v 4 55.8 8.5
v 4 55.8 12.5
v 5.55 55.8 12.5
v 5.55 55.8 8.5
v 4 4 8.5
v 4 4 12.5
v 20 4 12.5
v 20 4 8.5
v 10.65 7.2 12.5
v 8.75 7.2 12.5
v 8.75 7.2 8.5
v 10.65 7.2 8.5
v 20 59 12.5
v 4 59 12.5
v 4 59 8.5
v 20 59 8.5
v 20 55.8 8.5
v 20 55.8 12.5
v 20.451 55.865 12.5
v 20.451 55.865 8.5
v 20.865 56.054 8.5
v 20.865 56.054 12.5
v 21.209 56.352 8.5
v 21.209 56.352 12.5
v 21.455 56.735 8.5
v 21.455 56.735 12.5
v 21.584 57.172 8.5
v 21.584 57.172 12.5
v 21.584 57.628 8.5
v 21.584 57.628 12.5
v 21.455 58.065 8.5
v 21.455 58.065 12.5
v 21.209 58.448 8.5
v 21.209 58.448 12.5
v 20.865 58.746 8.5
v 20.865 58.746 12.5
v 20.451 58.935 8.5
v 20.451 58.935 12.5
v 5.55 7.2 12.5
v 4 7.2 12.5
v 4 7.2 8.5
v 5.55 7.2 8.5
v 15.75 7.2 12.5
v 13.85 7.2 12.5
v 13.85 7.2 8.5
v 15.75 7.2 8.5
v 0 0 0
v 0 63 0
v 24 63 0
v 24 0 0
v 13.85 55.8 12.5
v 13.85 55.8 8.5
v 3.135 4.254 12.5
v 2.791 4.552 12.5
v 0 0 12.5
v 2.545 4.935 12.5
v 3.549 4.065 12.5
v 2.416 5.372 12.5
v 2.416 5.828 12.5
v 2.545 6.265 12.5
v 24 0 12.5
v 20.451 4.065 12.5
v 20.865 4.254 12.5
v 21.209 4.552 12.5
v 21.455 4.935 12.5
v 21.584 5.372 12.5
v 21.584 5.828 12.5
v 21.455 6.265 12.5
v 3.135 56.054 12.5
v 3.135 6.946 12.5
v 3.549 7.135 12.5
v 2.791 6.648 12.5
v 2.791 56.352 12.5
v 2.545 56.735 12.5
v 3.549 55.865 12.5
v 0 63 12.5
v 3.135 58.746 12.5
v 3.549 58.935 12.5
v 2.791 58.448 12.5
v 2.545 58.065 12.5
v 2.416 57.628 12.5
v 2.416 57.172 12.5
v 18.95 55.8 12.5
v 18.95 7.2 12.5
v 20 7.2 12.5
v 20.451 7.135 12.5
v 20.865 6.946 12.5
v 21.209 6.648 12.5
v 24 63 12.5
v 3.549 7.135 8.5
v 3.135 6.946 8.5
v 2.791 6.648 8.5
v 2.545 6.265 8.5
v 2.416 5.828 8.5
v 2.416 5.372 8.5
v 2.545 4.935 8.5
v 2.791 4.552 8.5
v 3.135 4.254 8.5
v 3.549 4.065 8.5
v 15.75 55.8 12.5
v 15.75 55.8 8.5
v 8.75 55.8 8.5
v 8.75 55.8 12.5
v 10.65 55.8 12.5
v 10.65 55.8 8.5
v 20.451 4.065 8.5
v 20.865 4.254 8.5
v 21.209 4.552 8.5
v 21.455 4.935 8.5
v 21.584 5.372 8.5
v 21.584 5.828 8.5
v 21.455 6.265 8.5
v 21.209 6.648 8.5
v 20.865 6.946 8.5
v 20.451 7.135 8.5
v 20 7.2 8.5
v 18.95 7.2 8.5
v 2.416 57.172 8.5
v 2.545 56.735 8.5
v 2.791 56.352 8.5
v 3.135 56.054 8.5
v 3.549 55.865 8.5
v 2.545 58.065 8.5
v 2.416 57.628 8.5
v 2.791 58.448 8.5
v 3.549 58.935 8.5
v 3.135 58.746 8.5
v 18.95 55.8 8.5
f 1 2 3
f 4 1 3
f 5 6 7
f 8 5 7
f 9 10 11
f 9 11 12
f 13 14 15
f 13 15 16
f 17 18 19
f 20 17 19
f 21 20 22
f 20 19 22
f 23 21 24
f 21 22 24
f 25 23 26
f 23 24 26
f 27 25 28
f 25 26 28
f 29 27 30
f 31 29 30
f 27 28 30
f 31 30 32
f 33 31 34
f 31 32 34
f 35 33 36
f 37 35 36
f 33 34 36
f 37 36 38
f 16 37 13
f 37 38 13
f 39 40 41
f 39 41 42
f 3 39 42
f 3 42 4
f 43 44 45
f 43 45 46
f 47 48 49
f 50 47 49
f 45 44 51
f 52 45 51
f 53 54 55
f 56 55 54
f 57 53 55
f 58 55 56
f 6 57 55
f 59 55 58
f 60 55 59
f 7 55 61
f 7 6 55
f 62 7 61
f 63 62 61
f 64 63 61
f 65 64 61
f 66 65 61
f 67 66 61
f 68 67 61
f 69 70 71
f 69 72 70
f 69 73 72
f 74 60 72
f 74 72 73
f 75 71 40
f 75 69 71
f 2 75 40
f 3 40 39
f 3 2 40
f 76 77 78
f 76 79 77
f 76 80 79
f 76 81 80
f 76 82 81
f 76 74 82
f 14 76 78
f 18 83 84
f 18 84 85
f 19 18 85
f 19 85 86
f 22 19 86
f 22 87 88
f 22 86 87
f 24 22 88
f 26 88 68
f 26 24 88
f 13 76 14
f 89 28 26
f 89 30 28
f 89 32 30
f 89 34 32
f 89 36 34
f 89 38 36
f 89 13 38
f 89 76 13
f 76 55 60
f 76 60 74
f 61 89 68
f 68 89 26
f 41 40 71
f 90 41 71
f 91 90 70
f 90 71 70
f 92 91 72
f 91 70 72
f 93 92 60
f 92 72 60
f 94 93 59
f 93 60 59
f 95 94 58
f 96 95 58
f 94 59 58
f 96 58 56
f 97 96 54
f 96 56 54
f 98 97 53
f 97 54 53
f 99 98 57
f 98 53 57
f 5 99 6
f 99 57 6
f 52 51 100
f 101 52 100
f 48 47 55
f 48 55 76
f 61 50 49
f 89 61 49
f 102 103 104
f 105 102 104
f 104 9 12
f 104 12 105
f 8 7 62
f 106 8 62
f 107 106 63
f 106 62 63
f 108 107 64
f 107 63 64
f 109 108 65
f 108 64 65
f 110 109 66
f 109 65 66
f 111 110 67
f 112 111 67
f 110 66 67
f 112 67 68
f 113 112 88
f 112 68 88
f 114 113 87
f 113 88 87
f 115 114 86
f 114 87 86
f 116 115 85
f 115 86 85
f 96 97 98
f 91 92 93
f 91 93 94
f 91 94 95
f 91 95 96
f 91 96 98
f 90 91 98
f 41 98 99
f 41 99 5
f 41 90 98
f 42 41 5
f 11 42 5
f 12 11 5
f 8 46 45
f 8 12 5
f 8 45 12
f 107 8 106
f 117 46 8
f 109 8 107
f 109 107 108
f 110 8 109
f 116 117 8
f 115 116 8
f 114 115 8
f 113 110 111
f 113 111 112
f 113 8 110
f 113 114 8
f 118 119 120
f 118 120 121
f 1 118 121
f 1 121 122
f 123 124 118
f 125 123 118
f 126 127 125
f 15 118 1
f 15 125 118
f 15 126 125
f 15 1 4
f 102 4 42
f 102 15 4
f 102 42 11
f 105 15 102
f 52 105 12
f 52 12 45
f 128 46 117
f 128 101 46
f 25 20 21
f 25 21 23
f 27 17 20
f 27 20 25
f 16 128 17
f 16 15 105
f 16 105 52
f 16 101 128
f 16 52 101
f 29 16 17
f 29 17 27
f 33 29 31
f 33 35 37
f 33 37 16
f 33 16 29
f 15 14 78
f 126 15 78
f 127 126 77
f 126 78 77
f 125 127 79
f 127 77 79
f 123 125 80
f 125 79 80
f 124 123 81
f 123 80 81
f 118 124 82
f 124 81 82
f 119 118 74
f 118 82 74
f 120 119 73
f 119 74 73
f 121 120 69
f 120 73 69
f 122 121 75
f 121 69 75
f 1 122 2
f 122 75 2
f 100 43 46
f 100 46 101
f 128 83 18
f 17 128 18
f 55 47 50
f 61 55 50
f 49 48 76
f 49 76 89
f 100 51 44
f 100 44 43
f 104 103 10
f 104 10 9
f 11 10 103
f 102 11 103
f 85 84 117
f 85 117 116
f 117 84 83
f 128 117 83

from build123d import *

# Parameters (mm, degrees)
F0_W     = 24
F0_H     = 63
F1_DEPTH = 12.5
F2_W     = 3.2
F2_H     = 55
F3_DEPTH = 4
F4_W     = 16
F4_H     = 3.2
F5_DEPTH = 4


with BuildPart() as f1:
    # F0 (on Top) → F1 (new body)
    with BuildSketch(Plane.XY):
        with Locations((12, 31.5)):
            Rectangle(F0_W, F0_H)
    extrude(amount=F1_DEPTH)

    # F2 (on face) → F3 (cut)
    with BuildSketch(Plane.XY.offset(12.5)):
        with Locations((7.15, 31.5)):
            Rectangle(F2_W, F2_H)
        with Locations((12.25, 31.5)):
            Rectangle(F2_W, F2_H)
        with Locations((17.35, 31.5)):
            Rectangle(F2_W, F2_H)
    extrude(amount=-F3_DEPTH, mode=Mode.SUBTRACT)

    # F4 (on face) → F5 (cut)
    with BuildSketch(Plane.XY.offset(12.5)):
        with Locations((12, 57.4)):
            Rectangle(F4_W, F4_H)
        with BuildLine():
            Line((4, 55.8), (4, 59))
            ThreePointArc((4, 59), (2.4, 57.4), (4, 55.8))
        make_face()
        with BuildLine():
            ThreePointArc((20, 55.8), (21.6, 57.4), (20, 59))
            Line((20, 59), (20, 55.8))
        make_face()
        with Locations((12, 5.6)):
            Rectangle(F4_W, F4_H)
        with BuildLine():
            ThreePointArc((4, 7.2), (2.4, 5.6), (4, 4))
            Line((4, 4), (4, 7.2))
        make_face()
        with BuildLine():
            Line((20, 7.2), (20, 4))
            ThreePointArc((20, 4), (21.6, 5.6), (20, 7.2))
        make_face()
    extrude(amount=-F5_DEPTH, mode=Mode.SUBTRACT)


solid = f1.part
